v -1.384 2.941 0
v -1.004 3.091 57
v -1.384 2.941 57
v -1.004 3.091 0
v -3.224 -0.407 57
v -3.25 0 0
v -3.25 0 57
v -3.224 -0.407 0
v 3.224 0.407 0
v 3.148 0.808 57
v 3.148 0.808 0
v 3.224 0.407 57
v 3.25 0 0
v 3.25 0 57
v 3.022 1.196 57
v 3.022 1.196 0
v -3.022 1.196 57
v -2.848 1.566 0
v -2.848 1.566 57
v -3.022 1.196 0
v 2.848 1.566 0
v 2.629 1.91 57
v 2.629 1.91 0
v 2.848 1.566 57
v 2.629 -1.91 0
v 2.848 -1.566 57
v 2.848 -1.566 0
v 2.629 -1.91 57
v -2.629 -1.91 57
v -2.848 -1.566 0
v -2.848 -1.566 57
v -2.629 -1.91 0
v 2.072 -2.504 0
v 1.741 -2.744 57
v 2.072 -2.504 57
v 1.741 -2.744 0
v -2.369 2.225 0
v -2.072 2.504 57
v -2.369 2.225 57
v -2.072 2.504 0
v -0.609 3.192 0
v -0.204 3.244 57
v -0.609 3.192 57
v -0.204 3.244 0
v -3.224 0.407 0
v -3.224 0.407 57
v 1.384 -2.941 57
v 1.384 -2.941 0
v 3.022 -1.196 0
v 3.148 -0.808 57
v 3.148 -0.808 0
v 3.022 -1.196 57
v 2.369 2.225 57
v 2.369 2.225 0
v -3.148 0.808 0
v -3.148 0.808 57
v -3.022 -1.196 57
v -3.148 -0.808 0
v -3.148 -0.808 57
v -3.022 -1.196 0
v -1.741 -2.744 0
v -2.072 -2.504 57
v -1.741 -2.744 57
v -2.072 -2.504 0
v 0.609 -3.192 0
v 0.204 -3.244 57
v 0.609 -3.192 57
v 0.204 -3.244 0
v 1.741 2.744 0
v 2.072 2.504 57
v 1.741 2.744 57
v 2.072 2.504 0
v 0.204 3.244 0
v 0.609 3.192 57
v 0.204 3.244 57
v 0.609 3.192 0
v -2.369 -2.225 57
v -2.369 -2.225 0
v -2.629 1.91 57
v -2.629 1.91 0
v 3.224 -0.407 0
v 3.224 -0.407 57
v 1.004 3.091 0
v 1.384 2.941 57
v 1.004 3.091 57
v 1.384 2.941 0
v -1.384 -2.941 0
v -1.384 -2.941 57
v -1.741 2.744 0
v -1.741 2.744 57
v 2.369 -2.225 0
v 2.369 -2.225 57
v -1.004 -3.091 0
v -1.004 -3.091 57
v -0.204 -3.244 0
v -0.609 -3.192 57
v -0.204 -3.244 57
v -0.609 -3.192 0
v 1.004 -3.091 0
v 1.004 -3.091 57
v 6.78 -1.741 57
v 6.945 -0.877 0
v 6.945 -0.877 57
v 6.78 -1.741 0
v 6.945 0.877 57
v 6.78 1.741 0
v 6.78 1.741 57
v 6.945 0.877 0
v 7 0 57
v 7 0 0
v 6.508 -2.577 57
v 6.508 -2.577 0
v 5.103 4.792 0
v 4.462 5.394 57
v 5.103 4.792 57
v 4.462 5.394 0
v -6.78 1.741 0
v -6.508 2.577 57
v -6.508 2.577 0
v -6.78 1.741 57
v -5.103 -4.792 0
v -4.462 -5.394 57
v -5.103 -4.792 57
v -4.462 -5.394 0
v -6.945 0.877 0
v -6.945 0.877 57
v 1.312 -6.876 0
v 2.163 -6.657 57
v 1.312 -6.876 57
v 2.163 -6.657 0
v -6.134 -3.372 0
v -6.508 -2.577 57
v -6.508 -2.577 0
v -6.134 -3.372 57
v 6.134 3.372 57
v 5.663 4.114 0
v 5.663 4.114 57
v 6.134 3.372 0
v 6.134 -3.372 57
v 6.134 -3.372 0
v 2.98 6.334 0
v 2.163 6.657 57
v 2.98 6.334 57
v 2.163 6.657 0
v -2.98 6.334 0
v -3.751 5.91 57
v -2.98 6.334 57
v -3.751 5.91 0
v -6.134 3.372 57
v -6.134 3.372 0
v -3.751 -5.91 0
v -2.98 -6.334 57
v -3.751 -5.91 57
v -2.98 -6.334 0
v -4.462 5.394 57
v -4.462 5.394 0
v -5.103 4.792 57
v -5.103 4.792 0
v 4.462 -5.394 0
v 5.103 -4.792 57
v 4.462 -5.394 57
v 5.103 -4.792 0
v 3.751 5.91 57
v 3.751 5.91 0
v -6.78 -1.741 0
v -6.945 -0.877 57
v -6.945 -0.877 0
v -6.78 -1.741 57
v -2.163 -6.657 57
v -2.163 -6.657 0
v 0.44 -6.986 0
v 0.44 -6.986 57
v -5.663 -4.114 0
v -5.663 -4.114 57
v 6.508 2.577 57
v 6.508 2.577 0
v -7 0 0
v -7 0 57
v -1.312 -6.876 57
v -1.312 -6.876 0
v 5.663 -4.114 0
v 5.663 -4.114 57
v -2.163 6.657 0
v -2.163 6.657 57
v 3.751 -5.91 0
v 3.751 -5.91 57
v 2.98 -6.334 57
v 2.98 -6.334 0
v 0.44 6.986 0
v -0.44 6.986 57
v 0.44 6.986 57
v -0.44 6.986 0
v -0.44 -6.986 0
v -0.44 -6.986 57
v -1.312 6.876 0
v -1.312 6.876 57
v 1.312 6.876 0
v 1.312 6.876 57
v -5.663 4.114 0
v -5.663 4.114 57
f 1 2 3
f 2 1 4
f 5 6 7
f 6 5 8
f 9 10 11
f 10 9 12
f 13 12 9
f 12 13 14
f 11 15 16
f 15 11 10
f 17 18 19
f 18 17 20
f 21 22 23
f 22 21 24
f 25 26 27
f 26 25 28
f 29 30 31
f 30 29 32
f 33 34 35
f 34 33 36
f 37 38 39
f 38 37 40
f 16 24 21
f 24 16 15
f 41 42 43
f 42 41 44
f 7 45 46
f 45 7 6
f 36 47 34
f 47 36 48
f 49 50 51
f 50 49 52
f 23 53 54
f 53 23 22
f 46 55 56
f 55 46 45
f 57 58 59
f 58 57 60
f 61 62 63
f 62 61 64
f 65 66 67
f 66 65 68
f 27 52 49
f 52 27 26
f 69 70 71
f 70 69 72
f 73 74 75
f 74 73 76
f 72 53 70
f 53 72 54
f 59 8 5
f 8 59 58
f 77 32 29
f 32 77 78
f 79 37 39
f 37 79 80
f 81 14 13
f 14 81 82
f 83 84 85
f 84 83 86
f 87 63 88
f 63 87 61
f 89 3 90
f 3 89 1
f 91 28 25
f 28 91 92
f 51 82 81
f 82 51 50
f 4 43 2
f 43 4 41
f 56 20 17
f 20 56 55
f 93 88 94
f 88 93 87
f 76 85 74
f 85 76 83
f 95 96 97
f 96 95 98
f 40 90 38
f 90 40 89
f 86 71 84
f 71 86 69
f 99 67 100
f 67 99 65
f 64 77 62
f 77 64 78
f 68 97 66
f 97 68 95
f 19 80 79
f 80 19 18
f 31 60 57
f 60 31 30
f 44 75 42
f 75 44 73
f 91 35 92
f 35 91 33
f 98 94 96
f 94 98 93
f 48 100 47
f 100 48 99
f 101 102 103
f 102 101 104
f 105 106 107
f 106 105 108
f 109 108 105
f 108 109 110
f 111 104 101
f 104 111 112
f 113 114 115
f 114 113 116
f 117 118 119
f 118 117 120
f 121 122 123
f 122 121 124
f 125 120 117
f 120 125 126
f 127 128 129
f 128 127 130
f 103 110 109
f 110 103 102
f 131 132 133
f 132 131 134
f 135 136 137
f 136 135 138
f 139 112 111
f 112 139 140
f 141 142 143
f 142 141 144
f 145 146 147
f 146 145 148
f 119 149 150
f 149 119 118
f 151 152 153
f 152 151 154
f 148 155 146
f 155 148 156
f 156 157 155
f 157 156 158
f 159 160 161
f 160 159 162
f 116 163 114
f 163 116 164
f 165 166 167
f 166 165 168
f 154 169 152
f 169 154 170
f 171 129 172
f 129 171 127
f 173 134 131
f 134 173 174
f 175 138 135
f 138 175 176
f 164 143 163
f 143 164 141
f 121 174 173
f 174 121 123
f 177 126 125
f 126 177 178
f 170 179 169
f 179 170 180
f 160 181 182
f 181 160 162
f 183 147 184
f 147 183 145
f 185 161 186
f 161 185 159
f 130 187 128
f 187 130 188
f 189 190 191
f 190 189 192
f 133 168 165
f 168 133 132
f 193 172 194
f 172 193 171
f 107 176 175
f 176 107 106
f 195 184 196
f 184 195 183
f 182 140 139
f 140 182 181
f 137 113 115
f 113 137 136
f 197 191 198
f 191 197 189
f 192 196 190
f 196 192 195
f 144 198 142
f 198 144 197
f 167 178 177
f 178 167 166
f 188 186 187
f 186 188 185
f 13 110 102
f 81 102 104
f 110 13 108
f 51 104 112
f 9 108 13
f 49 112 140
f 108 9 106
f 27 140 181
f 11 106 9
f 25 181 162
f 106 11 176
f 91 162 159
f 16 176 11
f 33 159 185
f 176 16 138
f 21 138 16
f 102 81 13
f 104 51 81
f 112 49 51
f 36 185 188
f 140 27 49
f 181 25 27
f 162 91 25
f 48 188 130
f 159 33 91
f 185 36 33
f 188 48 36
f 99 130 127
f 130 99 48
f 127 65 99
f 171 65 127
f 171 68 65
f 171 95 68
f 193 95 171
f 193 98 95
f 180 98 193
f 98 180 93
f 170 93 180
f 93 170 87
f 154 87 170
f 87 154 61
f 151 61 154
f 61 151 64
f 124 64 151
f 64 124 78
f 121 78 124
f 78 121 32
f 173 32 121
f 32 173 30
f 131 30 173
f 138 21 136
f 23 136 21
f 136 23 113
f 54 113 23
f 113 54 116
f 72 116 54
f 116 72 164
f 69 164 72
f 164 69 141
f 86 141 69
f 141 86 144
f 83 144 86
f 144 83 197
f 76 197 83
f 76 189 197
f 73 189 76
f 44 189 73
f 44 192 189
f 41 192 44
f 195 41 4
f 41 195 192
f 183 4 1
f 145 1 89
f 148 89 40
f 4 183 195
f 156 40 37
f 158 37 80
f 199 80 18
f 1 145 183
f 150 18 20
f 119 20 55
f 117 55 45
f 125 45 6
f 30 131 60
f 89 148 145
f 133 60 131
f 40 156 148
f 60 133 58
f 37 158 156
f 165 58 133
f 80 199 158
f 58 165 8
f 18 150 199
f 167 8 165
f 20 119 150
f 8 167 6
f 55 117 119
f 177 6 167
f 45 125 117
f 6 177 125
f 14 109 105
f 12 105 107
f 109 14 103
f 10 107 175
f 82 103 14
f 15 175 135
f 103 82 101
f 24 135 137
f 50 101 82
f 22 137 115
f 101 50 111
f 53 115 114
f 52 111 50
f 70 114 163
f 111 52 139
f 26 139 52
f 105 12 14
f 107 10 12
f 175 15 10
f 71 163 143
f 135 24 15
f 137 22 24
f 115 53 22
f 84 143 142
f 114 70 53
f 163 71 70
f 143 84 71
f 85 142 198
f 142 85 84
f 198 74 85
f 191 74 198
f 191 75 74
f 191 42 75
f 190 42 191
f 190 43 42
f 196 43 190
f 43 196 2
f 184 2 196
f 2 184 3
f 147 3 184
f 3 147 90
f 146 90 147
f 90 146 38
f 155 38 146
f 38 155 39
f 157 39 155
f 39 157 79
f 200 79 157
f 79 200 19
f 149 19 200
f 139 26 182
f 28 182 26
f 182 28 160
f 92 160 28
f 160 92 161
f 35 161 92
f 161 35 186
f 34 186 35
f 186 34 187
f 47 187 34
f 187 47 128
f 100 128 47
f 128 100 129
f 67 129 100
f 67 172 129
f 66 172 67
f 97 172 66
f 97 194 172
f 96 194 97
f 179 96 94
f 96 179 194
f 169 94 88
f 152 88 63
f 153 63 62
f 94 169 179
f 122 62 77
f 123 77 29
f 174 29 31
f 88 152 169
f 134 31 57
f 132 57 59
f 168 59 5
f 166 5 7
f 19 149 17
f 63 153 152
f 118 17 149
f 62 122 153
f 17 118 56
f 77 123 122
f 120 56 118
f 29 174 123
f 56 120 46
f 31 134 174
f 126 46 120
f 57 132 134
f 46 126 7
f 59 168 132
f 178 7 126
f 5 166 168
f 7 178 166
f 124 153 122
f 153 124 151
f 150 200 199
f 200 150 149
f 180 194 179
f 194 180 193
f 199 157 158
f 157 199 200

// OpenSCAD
$fn = 50;


difference() {
	union() {
		cylinder(h = 57, r = 7.0000000000);
	}
	union() {
		translate(v = [0.0000000000, 0.0000000000, -100.0000000000]) {
			cylinder(h = 200, r = 3.2500000000);
		}
		translate(v = [0.0000000000, 0.0000000000, -100.0000000000]) {
			cylinder(h = 200, r = 3.2500000000);
		}
		translate(v = [0.0000000000, 0.0000000000, -100.0000000000]) {
			cylinder(h = 200, r = 3.2500000000);
		}
		translate(v = [0.0000000000, 0.0000000000, -100.0000000000]) {
			cylinder(h = 200, r = 3.2500000000);
		}
	}
}
